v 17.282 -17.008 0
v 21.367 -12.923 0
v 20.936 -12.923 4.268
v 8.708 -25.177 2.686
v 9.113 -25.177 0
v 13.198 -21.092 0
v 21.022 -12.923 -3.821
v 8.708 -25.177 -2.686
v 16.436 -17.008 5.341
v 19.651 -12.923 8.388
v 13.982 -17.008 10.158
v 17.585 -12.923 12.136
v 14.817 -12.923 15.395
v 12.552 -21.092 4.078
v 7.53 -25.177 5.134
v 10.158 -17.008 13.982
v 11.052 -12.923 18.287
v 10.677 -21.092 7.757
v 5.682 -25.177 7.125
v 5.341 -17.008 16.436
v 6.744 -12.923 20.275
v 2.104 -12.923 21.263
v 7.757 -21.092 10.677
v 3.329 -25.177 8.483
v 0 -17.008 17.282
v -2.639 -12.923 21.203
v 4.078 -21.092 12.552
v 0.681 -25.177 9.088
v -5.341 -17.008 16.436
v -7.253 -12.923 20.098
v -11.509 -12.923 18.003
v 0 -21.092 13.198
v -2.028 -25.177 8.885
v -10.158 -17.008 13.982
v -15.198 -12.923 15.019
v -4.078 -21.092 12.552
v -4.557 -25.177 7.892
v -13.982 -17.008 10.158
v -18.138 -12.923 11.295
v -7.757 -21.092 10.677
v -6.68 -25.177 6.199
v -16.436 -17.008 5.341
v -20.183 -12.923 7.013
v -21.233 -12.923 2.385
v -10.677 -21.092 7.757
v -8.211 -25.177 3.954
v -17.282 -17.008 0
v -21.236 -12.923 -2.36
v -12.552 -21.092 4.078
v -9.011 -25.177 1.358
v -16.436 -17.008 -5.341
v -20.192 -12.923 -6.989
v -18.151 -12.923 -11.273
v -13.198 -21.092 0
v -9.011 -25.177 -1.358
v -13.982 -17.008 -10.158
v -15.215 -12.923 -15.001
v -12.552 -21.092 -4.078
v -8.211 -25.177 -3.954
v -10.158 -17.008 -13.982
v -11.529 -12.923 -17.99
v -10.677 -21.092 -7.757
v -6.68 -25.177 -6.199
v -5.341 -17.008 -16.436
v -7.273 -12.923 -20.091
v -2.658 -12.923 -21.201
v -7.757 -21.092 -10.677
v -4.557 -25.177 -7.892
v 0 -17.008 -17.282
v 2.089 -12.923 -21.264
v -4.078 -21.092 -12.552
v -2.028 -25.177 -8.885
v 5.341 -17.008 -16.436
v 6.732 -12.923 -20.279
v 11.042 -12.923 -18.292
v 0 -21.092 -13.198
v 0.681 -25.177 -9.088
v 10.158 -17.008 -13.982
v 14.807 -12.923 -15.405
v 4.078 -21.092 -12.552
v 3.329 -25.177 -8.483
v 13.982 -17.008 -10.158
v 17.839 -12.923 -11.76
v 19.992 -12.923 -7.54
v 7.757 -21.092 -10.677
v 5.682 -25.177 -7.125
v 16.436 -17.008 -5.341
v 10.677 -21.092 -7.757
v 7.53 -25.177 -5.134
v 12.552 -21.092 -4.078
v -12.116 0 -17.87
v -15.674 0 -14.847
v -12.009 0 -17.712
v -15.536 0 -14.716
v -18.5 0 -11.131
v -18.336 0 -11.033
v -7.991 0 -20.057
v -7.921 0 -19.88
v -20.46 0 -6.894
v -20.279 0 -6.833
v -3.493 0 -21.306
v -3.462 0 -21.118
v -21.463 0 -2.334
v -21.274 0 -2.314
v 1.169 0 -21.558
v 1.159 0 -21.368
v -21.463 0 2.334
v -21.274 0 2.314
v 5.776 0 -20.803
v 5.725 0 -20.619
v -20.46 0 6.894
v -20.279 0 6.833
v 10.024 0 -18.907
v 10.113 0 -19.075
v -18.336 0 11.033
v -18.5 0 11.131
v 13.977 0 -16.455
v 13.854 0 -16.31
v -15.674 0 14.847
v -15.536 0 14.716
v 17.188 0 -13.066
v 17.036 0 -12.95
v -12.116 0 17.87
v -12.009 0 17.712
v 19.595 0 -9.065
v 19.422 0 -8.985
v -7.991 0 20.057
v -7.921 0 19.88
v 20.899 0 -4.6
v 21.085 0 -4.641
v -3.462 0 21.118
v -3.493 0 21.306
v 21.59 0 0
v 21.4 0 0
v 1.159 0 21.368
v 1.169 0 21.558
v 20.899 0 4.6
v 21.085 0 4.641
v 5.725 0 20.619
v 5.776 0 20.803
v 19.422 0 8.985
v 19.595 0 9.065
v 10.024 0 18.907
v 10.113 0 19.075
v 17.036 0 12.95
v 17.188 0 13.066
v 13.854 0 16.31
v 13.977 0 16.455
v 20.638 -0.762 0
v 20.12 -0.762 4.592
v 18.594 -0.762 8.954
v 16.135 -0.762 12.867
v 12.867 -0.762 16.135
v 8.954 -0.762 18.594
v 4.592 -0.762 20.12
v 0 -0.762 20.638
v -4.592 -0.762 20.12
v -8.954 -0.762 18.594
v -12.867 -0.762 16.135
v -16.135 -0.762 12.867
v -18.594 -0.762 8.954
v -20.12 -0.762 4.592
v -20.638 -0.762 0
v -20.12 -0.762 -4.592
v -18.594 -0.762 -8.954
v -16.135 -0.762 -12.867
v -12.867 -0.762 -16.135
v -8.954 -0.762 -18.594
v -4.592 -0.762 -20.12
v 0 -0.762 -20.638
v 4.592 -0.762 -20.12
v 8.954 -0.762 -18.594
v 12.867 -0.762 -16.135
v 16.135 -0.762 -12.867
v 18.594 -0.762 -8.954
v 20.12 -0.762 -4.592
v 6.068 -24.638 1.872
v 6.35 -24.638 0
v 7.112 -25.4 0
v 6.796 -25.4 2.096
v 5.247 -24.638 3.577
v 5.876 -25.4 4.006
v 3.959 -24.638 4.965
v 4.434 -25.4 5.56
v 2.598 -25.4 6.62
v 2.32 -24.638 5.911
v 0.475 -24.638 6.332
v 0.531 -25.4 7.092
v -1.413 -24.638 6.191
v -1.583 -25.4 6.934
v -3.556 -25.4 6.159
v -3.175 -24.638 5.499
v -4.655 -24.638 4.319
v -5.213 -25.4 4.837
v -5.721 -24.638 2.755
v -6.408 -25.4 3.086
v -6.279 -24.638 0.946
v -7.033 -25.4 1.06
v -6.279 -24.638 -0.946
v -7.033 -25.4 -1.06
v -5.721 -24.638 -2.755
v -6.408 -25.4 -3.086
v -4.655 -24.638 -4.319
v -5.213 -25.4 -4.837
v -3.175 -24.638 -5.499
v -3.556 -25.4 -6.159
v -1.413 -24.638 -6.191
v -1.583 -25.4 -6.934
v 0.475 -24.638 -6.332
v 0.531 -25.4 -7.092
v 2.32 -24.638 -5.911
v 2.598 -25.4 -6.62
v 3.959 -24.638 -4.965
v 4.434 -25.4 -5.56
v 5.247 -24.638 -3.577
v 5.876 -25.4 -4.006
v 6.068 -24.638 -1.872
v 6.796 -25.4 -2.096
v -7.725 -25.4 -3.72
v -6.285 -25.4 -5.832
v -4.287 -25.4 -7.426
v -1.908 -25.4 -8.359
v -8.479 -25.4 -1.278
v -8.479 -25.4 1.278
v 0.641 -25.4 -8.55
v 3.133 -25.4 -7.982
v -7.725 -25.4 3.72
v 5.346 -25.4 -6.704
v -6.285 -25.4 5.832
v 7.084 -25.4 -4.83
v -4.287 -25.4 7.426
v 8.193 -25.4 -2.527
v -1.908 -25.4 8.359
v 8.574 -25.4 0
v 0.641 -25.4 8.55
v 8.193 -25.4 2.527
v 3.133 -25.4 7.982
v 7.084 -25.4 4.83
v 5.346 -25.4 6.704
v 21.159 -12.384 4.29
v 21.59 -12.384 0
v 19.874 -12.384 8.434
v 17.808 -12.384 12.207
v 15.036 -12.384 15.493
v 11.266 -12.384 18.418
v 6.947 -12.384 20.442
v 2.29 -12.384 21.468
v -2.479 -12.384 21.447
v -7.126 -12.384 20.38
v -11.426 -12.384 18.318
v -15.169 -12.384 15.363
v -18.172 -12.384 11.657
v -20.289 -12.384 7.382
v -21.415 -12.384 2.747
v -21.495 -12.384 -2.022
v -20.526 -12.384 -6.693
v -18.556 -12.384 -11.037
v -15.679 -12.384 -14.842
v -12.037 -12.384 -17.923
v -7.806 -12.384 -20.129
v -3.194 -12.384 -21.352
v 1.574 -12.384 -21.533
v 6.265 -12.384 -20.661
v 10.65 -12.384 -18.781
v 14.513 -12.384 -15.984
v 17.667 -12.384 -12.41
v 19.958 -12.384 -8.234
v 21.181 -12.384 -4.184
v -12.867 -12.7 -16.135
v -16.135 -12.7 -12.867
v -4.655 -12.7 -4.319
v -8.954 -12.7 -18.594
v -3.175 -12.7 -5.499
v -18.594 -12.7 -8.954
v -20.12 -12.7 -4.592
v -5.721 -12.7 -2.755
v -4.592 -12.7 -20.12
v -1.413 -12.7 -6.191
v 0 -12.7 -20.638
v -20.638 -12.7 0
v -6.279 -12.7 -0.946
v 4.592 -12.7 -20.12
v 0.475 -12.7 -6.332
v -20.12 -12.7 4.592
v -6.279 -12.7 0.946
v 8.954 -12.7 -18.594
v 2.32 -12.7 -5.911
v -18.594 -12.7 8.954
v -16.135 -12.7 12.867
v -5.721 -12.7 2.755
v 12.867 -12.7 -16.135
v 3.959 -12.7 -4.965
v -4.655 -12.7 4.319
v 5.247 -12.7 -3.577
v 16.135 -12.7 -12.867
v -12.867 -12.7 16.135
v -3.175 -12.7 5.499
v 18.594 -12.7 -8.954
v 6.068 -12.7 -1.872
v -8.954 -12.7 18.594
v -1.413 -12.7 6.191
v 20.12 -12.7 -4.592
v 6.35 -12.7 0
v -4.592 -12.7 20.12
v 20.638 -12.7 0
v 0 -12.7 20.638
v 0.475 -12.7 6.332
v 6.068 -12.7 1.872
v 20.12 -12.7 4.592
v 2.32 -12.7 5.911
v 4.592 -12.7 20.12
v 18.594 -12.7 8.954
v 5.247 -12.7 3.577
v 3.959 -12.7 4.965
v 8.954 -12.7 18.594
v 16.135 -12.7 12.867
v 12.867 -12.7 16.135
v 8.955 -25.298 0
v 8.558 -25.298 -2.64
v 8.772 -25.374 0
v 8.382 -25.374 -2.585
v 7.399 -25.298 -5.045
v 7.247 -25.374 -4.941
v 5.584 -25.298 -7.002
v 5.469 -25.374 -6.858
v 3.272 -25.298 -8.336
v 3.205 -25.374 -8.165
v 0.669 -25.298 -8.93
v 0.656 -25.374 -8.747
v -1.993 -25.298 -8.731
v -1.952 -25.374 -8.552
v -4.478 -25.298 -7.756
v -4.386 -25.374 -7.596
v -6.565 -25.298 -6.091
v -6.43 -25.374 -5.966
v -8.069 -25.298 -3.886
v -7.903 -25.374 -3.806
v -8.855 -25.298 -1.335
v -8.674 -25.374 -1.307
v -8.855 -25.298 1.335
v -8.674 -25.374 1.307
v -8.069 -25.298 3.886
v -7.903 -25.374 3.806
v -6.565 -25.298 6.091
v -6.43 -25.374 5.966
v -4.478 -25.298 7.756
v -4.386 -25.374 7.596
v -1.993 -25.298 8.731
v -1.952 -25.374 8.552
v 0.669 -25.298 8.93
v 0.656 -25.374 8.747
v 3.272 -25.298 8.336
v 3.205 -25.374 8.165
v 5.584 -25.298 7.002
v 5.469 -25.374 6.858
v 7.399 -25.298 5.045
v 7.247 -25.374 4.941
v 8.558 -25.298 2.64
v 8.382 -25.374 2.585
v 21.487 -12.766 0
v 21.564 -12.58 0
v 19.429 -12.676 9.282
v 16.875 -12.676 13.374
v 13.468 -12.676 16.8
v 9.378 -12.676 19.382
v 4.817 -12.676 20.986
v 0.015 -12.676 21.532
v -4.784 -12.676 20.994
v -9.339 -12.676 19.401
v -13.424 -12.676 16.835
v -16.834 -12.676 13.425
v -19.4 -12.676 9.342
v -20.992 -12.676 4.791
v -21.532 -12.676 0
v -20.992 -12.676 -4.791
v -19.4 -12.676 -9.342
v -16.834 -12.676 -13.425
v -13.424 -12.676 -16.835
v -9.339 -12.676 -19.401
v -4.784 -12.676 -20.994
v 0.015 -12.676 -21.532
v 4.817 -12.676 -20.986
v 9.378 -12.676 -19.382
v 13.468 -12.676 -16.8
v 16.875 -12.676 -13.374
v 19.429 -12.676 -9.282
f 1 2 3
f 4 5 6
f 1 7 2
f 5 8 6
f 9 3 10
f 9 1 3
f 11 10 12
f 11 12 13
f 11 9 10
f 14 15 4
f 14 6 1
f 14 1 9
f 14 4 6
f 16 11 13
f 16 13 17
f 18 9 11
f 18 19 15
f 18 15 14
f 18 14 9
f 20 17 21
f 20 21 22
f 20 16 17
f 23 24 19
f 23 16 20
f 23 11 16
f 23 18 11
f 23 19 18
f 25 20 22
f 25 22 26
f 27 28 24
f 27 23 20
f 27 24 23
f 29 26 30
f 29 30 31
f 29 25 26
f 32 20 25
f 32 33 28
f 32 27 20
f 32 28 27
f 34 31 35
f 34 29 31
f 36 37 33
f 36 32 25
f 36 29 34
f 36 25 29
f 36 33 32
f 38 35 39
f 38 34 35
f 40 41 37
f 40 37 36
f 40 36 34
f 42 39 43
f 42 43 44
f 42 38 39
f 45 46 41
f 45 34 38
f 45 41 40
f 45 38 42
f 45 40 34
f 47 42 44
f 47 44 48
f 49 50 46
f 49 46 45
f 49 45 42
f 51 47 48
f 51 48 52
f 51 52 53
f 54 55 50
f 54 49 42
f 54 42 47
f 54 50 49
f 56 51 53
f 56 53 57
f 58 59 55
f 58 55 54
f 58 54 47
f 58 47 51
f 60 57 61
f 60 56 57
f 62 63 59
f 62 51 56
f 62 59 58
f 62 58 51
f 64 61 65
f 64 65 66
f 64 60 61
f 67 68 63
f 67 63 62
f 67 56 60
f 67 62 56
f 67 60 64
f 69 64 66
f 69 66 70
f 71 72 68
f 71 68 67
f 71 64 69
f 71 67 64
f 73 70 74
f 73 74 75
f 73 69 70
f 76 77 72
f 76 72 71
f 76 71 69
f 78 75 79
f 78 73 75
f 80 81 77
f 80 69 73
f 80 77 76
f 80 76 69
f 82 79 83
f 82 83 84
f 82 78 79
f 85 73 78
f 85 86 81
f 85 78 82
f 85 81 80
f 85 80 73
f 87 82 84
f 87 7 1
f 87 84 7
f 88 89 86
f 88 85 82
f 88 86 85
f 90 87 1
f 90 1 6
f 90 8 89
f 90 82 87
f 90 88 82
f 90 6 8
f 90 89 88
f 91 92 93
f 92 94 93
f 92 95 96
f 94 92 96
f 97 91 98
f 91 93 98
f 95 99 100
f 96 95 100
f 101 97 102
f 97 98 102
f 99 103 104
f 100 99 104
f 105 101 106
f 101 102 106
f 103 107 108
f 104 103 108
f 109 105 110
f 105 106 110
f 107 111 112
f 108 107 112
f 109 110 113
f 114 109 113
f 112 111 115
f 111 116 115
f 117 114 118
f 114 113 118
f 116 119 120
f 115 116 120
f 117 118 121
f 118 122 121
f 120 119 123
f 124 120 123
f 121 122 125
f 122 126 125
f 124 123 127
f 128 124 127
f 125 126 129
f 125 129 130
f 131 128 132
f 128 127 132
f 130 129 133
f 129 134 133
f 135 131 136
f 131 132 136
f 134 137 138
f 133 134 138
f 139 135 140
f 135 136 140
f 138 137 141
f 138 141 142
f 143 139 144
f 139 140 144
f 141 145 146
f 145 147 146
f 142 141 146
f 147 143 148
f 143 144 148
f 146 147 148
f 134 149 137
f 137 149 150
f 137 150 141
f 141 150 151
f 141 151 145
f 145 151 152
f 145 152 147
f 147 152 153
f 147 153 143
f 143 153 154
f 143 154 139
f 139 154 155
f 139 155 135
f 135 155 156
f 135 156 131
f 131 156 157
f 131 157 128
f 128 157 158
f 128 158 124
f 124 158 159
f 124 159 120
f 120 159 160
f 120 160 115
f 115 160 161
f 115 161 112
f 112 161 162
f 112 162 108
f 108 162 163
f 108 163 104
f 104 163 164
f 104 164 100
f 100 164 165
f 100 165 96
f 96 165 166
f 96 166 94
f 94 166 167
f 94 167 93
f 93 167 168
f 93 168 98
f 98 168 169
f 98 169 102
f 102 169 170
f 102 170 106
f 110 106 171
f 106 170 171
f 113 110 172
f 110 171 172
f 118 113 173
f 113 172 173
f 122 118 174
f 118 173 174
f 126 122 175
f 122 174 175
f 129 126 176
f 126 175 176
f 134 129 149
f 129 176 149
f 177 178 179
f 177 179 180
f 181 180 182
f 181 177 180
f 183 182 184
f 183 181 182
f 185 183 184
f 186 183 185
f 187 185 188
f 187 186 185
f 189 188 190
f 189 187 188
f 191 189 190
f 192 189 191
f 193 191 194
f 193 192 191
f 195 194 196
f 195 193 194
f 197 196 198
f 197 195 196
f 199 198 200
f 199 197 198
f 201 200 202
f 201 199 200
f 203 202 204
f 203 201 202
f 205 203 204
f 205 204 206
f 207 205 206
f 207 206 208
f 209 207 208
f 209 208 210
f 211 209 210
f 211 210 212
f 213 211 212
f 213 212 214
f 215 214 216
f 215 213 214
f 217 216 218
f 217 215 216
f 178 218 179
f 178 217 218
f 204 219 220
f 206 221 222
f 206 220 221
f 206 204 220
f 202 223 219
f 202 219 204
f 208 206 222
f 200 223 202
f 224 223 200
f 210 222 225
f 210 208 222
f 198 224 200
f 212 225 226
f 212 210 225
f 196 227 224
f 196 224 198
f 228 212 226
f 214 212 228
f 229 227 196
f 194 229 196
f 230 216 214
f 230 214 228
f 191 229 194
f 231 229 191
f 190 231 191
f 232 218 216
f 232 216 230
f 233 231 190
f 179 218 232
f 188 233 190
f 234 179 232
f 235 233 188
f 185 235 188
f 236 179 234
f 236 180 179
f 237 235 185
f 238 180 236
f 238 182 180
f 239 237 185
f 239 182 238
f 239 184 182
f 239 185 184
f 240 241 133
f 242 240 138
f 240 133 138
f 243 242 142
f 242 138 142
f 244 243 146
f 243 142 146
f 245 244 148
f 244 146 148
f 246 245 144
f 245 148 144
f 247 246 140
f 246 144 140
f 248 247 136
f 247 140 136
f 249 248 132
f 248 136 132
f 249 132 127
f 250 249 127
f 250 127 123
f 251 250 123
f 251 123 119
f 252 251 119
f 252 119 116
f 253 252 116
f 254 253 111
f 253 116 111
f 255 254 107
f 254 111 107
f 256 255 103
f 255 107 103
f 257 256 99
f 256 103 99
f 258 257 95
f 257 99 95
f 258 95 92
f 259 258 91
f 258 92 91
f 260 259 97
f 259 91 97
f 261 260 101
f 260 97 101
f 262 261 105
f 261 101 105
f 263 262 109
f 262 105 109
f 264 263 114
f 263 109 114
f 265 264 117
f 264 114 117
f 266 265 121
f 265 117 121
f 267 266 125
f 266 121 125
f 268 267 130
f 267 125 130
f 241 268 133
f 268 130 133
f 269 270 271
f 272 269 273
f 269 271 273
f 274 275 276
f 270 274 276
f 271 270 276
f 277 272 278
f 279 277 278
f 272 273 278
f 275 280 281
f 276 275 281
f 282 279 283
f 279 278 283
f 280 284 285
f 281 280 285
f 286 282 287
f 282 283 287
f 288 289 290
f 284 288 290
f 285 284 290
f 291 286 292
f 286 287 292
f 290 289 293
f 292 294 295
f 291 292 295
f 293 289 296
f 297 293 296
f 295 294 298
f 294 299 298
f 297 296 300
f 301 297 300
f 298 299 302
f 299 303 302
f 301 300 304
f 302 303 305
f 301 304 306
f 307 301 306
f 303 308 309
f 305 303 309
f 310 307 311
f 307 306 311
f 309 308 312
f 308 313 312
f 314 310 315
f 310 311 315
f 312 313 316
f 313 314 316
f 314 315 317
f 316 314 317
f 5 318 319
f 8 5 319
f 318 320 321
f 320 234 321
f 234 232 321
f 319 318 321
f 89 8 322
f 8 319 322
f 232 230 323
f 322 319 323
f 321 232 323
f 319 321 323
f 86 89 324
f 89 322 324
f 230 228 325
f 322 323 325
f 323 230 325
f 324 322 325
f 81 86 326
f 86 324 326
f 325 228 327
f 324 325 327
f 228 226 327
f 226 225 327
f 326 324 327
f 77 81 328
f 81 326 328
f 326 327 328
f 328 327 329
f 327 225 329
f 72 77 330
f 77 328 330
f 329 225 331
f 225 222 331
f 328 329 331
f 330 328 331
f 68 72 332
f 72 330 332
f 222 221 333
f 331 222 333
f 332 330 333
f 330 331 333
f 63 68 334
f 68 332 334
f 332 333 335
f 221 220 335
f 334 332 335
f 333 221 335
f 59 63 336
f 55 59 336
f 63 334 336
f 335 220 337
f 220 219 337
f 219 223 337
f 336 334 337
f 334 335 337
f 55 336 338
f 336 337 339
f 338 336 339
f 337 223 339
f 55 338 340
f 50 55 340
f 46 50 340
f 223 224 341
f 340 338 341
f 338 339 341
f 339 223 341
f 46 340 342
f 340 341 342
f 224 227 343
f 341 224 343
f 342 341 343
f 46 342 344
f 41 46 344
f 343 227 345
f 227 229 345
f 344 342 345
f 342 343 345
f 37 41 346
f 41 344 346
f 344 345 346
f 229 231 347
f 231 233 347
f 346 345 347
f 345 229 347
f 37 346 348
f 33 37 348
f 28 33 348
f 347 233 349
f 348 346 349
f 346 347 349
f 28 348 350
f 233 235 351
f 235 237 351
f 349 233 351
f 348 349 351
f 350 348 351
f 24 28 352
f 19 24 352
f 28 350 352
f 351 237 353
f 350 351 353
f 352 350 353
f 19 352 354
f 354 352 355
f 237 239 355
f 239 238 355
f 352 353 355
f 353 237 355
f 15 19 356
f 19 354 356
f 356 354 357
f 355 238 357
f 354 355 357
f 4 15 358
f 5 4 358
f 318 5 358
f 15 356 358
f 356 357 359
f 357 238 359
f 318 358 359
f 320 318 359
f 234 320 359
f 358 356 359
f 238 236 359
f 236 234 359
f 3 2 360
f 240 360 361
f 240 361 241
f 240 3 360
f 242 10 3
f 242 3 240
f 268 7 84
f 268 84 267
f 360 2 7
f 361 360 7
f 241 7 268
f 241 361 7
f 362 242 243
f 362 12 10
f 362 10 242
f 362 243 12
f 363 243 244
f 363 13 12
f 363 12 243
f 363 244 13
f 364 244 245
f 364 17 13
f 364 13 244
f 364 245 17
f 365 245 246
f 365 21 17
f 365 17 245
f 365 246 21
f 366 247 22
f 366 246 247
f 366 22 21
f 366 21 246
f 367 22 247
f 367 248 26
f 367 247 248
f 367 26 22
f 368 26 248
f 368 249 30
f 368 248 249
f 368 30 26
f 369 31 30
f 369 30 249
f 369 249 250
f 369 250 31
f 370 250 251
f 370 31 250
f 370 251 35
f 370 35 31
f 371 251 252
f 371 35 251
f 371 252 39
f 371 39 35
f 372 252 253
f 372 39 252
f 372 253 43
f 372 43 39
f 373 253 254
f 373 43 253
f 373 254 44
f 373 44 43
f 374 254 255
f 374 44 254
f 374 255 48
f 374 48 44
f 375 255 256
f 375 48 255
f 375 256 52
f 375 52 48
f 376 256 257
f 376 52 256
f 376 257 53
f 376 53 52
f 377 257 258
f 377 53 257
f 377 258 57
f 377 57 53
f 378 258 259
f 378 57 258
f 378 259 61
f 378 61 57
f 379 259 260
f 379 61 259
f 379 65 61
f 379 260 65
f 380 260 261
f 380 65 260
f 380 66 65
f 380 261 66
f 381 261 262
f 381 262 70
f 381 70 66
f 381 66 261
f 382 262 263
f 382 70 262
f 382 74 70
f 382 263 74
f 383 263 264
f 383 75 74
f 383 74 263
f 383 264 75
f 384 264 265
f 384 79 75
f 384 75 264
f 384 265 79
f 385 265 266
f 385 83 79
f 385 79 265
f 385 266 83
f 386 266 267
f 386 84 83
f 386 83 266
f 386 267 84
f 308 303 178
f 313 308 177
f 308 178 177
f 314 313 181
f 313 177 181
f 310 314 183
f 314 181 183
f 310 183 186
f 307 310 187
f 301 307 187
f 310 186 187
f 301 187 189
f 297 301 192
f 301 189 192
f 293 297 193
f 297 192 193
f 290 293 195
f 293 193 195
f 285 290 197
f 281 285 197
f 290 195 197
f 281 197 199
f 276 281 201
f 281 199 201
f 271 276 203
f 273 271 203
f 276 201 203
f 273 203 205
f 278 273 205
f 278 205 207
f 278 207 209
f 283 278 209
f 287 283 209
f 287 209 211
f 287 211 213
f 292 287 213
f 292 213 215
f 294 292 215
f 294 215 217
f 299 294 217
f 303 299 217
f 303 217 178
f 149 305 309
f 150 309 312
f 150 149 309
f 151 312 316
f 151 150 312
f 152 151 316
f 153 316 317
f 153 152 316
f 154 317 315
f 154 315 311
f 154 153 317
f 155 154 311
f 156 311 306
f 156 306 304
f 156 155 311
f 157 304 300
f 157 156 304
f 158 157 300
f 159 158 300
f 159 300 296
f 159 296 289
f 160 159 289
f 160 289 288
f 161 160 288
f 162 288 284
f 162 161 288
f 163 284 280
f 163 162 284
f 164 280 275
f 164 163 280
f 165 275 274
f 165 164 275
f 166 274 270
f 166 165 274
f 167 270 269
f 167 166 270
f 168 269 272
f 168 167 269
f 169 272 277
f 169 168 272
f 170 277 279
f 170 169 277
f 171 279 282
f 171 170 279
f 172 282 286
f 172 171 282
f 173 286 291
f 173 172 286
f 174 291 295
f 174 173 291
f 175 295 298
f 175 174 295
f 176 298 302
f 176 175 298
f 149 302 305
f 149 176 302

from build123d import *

# Parameters (mm, degrees)
F0_R     = 21.59
F0_R_2   = 20.6375
F1_DEPTH = 12.7
F2_R     = 21.59
F3_DEPTH = 12.7
F3_TAPER = 45
F4_R     = 0.762
F5_R     = 6.35
F6_DEPTH = 25.4
F7_SIZE  = 0.762


with BuildPart() as f1:
    # F0 (on Front) → F1 (new body)
    with BuildSketch(Plane.XZ):
        Circle(F0_R)
        Circle(F0_R_2, mode=Mode.SUBTRACT)
    extrude(amount=F1_DEPTH)

    # F2 (on face) → F3 (join)
    with BuildSketch(Plane.XZ.offset(12.7)):
        Circle(F2_R)
    extrude(amount=F3_DEPTH, taper=F3_TAPER)

    # F4
    f4_edges = [f1.edges().sort_by_distance(p)[0] for p in [
        (-21.59, -12.7, 0),
        (-8.89, -25.4, 0),
    ]]
    fillet(f4_edges, radius=F4_R)

    # F5 (on face) → F6 (cut)
    with BuildSketch(Plane.XZ.offset(25.4)):
        Circle(F5_R)
    extrude(amount=-F6_DEPTH, mode=Mode.SUBTRACT)

    # F7
    f7_edges = [f1.edges().sort_by_distance(p)[0] for p in [
        (-6.35, -25.4, 0),
        (-20.6375, 0, 0),
    ]]
    chamfer(f7_edges, length=F7_SIZE)


solid = f1.part
